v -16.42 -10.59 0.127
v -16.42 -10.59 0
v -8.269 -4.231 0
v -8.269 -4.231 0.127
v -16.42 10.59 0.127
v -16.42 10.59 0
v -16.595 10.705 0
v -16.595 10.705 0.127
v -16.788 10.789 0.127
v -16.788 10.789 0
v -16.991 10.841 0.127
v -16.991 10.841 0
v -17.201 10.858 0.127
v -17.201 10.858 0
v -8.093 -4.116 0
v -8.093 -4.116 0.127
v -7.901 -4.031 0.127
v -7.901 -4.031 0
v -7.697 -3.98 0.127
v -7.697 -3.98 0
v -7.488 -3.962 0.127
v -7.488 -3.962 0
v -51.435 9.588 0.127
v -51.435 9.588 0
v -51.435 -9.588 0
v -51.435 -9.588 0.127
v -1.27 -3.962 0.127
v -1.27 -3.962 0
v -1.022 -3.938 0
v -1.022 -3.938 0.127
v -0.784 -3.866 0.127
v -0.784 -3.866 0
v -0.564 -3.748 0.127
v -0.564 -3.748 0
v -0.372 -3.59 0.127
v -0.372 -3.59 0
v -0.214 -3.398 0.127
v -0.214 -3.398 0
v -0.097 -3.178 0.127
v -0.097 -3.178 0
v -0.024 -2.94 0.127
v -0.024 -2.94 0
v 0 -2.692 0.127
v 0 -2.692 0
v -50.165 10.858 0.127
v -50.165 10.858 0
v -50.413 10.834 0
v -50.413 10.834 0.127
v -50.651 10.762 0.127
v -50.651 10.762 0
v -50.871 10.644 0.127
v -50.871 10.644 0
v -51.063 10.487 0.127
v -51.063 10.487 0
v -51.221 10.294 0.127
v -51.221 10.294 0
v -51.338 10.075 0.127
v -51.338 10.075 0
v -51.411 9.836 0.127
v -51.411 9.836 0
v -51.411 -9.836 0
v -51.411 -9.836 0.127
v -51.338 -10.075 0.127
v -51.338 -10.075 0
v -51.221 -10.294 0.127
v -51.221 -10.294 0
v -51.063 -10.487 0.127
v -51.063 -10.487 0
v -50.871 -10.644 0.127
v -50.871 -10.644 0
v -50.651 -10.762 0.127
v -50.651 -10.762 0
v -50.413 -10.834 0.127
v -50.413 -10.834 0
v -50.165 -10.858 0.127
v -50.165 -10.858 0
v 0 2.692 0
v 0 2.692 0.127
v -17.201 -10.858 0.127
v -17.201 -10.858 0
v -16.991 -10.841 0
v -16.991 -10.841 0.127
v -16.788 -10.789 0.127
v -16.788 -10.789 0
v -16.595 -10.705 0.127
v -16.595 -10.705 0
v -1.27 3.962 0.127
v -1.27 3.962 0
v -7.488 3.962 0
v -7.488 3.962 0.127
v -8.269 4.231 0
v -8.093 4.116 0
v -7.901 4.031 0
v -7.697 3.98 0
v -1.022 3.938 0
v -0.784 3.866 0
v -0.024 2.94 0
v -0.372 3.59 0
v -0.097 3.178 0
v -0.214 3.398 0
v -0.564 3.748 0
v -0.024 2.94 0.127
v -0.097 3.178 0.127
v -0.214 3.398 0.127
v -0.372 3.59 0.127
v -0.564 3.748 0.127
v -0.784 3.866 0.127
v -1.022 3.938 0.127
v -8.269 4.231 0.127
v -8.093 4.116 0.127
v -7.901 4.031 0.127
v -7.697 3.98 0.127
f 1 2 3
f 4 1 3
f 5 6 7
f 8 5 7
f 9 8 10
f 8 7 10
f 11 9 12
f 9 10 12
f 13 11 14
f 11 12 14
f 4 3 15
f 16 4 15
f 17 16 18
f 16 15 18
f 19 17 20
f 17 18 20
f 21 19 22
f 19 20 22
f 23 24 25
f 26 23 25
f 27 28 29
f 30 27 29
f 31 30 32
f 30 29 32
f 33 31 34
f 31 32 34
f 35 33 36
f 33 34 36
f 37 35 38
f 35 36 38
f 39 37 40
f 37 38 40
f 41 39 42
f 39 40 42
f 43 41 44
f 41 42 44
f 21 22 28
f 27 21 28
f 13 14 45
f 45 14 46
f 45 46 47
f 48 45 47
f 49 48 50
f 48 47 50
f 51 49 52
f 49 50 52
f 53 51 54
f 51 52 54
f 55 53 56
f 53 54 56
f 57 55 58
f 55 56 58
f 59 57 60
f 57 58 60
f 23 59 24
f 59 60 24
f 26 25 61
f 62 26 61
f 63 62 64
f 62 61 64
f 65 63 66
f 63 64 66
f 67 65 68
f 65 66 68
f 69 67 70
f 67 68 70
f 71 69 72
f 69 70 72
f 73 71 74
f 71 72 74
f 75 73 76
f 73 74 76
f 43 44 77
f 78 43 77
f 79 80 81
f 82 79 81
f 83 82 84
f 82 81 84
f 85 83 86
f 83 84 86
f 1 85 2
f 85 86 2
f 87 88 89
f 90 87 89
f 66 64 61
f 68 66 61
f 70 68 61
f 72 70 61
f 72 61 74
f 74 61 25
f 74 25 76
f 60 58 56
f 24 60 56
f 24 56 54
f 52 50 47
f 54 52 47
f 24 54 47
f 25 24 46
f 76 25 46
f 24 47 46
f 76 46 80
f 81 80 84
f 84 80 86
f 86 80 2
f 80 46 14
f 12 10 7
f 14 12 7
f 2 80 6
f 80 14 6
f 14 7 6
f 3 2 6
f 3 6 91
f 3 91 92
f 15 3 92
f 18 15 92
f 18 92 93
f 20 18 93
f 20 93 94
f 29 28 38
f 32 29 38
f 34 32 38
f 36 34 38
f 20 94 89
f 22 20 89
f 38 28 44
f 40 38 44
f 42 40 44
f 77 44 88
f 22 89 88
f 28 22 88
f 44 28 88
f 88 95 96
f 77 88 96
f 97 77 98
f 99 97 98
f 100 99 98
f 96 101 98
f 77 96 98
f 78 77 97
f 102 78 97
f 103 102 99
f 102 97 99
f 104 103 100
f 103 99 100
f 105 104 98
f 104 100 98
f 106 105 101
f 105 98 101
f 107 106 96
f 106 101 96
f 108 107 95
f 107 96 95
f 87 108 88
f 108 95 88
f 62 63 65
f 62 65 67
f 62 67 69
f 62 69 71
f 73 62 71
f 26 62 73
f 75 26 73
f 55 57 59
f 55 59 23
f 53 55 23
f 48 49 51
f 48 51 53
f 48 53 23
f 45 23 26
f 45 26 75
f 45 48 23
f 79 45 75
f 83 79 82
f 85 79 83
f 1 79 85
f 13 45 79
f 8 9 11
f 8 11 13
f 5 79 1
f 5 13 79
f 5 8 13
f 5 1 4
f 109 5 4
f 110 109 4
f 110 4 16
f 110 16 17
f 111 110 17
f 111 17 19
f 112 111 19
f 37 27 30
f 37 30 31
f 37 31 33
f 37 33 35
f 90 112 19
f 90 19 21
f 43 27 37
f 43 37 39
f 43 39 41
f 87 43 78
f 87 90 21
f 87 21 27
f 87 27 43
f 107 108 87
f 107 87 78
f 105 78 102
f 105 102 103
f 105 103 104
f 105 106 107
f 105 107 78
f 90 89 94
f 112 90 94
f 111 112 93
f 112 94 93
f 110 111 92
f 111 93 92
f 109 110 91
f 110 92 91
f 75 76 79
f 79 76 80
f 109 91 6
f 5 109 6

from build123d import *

# Parameters (mm, degrees)
F1_DEPTH = 0.127


# Not quite as in the source:
# - the program builds the solid bodies; features that only make, move or delete a surface that nothing else refers to are left out


with BuildPart() as f1:
    # F0 (on Top) → F1 (new body)
    with BuildSketch(Plane.XY):
        with BuildLine():
            Line((0, -2.6924), (0, 0))
            Line((0, 0), (0, 2.6924))
            ThreePointArc((0, 2.6924), (-0.3719743879, 3.5904256121), (-1.27, 3.9624))
            Line((-1.27, 3.9624), (-7.4879951317, 3.9624))
            ThreePointArc((-7.4879951317, 3.9624), (-7.9010514025, 4.0314484951), (-8.2691928483, 4.2310857998))
            Line((-8.2691928483, 4.2310857998), (-16.4196071517, 10.5898142002))
            ThreePointArc((-16.4196071517, 10.5898142002), (-16.7877485975, 10.7894515049), (-17.2008048683, 10.8585))
            Line((-17.2008048683, 10.8585), (-50.165, 10.8585))
            ThreePointArc((-50.165, 10.8585), (-51.0630256121, 10.4865256121), (-51.435, 9.5885))
            Line((-51.435, 9.5885), (-51.435, 0))
            Line((-51.435, 0), (-51.435, -9.5885))
            ThreePointArc((-51.435, -9.5885), (-51.0630256121, -10.4865256121), (-50.165, -10.8585))
            Line((-50.165, -10.8585), (-17.2008048683, -10.8585))
            ThreePointArc((-17.2008048683, -10.8585), (-16.7877485975, -10.7894515049), (-16.4196071517, -10.5898142002))
            Line((-16.4196071517, -10.5898142002), (-8.2691928483, -4.2310857998))
            ThreePointArc((-8.2691928483, -4.2310857998), (-7.9010514025, -4.0314484951), (-7.4879951317, -3.9624))
            Line((-7.4879951317, -3.9624), (-1.27, -3.9624))
            ThreePointArc((-1.27, -3.9624), (-0.3719743879, -3.5904256121), (0, -2.6924))
        make_face()
    extrude(amount=F1_DEPTH)


solid = f1.part
